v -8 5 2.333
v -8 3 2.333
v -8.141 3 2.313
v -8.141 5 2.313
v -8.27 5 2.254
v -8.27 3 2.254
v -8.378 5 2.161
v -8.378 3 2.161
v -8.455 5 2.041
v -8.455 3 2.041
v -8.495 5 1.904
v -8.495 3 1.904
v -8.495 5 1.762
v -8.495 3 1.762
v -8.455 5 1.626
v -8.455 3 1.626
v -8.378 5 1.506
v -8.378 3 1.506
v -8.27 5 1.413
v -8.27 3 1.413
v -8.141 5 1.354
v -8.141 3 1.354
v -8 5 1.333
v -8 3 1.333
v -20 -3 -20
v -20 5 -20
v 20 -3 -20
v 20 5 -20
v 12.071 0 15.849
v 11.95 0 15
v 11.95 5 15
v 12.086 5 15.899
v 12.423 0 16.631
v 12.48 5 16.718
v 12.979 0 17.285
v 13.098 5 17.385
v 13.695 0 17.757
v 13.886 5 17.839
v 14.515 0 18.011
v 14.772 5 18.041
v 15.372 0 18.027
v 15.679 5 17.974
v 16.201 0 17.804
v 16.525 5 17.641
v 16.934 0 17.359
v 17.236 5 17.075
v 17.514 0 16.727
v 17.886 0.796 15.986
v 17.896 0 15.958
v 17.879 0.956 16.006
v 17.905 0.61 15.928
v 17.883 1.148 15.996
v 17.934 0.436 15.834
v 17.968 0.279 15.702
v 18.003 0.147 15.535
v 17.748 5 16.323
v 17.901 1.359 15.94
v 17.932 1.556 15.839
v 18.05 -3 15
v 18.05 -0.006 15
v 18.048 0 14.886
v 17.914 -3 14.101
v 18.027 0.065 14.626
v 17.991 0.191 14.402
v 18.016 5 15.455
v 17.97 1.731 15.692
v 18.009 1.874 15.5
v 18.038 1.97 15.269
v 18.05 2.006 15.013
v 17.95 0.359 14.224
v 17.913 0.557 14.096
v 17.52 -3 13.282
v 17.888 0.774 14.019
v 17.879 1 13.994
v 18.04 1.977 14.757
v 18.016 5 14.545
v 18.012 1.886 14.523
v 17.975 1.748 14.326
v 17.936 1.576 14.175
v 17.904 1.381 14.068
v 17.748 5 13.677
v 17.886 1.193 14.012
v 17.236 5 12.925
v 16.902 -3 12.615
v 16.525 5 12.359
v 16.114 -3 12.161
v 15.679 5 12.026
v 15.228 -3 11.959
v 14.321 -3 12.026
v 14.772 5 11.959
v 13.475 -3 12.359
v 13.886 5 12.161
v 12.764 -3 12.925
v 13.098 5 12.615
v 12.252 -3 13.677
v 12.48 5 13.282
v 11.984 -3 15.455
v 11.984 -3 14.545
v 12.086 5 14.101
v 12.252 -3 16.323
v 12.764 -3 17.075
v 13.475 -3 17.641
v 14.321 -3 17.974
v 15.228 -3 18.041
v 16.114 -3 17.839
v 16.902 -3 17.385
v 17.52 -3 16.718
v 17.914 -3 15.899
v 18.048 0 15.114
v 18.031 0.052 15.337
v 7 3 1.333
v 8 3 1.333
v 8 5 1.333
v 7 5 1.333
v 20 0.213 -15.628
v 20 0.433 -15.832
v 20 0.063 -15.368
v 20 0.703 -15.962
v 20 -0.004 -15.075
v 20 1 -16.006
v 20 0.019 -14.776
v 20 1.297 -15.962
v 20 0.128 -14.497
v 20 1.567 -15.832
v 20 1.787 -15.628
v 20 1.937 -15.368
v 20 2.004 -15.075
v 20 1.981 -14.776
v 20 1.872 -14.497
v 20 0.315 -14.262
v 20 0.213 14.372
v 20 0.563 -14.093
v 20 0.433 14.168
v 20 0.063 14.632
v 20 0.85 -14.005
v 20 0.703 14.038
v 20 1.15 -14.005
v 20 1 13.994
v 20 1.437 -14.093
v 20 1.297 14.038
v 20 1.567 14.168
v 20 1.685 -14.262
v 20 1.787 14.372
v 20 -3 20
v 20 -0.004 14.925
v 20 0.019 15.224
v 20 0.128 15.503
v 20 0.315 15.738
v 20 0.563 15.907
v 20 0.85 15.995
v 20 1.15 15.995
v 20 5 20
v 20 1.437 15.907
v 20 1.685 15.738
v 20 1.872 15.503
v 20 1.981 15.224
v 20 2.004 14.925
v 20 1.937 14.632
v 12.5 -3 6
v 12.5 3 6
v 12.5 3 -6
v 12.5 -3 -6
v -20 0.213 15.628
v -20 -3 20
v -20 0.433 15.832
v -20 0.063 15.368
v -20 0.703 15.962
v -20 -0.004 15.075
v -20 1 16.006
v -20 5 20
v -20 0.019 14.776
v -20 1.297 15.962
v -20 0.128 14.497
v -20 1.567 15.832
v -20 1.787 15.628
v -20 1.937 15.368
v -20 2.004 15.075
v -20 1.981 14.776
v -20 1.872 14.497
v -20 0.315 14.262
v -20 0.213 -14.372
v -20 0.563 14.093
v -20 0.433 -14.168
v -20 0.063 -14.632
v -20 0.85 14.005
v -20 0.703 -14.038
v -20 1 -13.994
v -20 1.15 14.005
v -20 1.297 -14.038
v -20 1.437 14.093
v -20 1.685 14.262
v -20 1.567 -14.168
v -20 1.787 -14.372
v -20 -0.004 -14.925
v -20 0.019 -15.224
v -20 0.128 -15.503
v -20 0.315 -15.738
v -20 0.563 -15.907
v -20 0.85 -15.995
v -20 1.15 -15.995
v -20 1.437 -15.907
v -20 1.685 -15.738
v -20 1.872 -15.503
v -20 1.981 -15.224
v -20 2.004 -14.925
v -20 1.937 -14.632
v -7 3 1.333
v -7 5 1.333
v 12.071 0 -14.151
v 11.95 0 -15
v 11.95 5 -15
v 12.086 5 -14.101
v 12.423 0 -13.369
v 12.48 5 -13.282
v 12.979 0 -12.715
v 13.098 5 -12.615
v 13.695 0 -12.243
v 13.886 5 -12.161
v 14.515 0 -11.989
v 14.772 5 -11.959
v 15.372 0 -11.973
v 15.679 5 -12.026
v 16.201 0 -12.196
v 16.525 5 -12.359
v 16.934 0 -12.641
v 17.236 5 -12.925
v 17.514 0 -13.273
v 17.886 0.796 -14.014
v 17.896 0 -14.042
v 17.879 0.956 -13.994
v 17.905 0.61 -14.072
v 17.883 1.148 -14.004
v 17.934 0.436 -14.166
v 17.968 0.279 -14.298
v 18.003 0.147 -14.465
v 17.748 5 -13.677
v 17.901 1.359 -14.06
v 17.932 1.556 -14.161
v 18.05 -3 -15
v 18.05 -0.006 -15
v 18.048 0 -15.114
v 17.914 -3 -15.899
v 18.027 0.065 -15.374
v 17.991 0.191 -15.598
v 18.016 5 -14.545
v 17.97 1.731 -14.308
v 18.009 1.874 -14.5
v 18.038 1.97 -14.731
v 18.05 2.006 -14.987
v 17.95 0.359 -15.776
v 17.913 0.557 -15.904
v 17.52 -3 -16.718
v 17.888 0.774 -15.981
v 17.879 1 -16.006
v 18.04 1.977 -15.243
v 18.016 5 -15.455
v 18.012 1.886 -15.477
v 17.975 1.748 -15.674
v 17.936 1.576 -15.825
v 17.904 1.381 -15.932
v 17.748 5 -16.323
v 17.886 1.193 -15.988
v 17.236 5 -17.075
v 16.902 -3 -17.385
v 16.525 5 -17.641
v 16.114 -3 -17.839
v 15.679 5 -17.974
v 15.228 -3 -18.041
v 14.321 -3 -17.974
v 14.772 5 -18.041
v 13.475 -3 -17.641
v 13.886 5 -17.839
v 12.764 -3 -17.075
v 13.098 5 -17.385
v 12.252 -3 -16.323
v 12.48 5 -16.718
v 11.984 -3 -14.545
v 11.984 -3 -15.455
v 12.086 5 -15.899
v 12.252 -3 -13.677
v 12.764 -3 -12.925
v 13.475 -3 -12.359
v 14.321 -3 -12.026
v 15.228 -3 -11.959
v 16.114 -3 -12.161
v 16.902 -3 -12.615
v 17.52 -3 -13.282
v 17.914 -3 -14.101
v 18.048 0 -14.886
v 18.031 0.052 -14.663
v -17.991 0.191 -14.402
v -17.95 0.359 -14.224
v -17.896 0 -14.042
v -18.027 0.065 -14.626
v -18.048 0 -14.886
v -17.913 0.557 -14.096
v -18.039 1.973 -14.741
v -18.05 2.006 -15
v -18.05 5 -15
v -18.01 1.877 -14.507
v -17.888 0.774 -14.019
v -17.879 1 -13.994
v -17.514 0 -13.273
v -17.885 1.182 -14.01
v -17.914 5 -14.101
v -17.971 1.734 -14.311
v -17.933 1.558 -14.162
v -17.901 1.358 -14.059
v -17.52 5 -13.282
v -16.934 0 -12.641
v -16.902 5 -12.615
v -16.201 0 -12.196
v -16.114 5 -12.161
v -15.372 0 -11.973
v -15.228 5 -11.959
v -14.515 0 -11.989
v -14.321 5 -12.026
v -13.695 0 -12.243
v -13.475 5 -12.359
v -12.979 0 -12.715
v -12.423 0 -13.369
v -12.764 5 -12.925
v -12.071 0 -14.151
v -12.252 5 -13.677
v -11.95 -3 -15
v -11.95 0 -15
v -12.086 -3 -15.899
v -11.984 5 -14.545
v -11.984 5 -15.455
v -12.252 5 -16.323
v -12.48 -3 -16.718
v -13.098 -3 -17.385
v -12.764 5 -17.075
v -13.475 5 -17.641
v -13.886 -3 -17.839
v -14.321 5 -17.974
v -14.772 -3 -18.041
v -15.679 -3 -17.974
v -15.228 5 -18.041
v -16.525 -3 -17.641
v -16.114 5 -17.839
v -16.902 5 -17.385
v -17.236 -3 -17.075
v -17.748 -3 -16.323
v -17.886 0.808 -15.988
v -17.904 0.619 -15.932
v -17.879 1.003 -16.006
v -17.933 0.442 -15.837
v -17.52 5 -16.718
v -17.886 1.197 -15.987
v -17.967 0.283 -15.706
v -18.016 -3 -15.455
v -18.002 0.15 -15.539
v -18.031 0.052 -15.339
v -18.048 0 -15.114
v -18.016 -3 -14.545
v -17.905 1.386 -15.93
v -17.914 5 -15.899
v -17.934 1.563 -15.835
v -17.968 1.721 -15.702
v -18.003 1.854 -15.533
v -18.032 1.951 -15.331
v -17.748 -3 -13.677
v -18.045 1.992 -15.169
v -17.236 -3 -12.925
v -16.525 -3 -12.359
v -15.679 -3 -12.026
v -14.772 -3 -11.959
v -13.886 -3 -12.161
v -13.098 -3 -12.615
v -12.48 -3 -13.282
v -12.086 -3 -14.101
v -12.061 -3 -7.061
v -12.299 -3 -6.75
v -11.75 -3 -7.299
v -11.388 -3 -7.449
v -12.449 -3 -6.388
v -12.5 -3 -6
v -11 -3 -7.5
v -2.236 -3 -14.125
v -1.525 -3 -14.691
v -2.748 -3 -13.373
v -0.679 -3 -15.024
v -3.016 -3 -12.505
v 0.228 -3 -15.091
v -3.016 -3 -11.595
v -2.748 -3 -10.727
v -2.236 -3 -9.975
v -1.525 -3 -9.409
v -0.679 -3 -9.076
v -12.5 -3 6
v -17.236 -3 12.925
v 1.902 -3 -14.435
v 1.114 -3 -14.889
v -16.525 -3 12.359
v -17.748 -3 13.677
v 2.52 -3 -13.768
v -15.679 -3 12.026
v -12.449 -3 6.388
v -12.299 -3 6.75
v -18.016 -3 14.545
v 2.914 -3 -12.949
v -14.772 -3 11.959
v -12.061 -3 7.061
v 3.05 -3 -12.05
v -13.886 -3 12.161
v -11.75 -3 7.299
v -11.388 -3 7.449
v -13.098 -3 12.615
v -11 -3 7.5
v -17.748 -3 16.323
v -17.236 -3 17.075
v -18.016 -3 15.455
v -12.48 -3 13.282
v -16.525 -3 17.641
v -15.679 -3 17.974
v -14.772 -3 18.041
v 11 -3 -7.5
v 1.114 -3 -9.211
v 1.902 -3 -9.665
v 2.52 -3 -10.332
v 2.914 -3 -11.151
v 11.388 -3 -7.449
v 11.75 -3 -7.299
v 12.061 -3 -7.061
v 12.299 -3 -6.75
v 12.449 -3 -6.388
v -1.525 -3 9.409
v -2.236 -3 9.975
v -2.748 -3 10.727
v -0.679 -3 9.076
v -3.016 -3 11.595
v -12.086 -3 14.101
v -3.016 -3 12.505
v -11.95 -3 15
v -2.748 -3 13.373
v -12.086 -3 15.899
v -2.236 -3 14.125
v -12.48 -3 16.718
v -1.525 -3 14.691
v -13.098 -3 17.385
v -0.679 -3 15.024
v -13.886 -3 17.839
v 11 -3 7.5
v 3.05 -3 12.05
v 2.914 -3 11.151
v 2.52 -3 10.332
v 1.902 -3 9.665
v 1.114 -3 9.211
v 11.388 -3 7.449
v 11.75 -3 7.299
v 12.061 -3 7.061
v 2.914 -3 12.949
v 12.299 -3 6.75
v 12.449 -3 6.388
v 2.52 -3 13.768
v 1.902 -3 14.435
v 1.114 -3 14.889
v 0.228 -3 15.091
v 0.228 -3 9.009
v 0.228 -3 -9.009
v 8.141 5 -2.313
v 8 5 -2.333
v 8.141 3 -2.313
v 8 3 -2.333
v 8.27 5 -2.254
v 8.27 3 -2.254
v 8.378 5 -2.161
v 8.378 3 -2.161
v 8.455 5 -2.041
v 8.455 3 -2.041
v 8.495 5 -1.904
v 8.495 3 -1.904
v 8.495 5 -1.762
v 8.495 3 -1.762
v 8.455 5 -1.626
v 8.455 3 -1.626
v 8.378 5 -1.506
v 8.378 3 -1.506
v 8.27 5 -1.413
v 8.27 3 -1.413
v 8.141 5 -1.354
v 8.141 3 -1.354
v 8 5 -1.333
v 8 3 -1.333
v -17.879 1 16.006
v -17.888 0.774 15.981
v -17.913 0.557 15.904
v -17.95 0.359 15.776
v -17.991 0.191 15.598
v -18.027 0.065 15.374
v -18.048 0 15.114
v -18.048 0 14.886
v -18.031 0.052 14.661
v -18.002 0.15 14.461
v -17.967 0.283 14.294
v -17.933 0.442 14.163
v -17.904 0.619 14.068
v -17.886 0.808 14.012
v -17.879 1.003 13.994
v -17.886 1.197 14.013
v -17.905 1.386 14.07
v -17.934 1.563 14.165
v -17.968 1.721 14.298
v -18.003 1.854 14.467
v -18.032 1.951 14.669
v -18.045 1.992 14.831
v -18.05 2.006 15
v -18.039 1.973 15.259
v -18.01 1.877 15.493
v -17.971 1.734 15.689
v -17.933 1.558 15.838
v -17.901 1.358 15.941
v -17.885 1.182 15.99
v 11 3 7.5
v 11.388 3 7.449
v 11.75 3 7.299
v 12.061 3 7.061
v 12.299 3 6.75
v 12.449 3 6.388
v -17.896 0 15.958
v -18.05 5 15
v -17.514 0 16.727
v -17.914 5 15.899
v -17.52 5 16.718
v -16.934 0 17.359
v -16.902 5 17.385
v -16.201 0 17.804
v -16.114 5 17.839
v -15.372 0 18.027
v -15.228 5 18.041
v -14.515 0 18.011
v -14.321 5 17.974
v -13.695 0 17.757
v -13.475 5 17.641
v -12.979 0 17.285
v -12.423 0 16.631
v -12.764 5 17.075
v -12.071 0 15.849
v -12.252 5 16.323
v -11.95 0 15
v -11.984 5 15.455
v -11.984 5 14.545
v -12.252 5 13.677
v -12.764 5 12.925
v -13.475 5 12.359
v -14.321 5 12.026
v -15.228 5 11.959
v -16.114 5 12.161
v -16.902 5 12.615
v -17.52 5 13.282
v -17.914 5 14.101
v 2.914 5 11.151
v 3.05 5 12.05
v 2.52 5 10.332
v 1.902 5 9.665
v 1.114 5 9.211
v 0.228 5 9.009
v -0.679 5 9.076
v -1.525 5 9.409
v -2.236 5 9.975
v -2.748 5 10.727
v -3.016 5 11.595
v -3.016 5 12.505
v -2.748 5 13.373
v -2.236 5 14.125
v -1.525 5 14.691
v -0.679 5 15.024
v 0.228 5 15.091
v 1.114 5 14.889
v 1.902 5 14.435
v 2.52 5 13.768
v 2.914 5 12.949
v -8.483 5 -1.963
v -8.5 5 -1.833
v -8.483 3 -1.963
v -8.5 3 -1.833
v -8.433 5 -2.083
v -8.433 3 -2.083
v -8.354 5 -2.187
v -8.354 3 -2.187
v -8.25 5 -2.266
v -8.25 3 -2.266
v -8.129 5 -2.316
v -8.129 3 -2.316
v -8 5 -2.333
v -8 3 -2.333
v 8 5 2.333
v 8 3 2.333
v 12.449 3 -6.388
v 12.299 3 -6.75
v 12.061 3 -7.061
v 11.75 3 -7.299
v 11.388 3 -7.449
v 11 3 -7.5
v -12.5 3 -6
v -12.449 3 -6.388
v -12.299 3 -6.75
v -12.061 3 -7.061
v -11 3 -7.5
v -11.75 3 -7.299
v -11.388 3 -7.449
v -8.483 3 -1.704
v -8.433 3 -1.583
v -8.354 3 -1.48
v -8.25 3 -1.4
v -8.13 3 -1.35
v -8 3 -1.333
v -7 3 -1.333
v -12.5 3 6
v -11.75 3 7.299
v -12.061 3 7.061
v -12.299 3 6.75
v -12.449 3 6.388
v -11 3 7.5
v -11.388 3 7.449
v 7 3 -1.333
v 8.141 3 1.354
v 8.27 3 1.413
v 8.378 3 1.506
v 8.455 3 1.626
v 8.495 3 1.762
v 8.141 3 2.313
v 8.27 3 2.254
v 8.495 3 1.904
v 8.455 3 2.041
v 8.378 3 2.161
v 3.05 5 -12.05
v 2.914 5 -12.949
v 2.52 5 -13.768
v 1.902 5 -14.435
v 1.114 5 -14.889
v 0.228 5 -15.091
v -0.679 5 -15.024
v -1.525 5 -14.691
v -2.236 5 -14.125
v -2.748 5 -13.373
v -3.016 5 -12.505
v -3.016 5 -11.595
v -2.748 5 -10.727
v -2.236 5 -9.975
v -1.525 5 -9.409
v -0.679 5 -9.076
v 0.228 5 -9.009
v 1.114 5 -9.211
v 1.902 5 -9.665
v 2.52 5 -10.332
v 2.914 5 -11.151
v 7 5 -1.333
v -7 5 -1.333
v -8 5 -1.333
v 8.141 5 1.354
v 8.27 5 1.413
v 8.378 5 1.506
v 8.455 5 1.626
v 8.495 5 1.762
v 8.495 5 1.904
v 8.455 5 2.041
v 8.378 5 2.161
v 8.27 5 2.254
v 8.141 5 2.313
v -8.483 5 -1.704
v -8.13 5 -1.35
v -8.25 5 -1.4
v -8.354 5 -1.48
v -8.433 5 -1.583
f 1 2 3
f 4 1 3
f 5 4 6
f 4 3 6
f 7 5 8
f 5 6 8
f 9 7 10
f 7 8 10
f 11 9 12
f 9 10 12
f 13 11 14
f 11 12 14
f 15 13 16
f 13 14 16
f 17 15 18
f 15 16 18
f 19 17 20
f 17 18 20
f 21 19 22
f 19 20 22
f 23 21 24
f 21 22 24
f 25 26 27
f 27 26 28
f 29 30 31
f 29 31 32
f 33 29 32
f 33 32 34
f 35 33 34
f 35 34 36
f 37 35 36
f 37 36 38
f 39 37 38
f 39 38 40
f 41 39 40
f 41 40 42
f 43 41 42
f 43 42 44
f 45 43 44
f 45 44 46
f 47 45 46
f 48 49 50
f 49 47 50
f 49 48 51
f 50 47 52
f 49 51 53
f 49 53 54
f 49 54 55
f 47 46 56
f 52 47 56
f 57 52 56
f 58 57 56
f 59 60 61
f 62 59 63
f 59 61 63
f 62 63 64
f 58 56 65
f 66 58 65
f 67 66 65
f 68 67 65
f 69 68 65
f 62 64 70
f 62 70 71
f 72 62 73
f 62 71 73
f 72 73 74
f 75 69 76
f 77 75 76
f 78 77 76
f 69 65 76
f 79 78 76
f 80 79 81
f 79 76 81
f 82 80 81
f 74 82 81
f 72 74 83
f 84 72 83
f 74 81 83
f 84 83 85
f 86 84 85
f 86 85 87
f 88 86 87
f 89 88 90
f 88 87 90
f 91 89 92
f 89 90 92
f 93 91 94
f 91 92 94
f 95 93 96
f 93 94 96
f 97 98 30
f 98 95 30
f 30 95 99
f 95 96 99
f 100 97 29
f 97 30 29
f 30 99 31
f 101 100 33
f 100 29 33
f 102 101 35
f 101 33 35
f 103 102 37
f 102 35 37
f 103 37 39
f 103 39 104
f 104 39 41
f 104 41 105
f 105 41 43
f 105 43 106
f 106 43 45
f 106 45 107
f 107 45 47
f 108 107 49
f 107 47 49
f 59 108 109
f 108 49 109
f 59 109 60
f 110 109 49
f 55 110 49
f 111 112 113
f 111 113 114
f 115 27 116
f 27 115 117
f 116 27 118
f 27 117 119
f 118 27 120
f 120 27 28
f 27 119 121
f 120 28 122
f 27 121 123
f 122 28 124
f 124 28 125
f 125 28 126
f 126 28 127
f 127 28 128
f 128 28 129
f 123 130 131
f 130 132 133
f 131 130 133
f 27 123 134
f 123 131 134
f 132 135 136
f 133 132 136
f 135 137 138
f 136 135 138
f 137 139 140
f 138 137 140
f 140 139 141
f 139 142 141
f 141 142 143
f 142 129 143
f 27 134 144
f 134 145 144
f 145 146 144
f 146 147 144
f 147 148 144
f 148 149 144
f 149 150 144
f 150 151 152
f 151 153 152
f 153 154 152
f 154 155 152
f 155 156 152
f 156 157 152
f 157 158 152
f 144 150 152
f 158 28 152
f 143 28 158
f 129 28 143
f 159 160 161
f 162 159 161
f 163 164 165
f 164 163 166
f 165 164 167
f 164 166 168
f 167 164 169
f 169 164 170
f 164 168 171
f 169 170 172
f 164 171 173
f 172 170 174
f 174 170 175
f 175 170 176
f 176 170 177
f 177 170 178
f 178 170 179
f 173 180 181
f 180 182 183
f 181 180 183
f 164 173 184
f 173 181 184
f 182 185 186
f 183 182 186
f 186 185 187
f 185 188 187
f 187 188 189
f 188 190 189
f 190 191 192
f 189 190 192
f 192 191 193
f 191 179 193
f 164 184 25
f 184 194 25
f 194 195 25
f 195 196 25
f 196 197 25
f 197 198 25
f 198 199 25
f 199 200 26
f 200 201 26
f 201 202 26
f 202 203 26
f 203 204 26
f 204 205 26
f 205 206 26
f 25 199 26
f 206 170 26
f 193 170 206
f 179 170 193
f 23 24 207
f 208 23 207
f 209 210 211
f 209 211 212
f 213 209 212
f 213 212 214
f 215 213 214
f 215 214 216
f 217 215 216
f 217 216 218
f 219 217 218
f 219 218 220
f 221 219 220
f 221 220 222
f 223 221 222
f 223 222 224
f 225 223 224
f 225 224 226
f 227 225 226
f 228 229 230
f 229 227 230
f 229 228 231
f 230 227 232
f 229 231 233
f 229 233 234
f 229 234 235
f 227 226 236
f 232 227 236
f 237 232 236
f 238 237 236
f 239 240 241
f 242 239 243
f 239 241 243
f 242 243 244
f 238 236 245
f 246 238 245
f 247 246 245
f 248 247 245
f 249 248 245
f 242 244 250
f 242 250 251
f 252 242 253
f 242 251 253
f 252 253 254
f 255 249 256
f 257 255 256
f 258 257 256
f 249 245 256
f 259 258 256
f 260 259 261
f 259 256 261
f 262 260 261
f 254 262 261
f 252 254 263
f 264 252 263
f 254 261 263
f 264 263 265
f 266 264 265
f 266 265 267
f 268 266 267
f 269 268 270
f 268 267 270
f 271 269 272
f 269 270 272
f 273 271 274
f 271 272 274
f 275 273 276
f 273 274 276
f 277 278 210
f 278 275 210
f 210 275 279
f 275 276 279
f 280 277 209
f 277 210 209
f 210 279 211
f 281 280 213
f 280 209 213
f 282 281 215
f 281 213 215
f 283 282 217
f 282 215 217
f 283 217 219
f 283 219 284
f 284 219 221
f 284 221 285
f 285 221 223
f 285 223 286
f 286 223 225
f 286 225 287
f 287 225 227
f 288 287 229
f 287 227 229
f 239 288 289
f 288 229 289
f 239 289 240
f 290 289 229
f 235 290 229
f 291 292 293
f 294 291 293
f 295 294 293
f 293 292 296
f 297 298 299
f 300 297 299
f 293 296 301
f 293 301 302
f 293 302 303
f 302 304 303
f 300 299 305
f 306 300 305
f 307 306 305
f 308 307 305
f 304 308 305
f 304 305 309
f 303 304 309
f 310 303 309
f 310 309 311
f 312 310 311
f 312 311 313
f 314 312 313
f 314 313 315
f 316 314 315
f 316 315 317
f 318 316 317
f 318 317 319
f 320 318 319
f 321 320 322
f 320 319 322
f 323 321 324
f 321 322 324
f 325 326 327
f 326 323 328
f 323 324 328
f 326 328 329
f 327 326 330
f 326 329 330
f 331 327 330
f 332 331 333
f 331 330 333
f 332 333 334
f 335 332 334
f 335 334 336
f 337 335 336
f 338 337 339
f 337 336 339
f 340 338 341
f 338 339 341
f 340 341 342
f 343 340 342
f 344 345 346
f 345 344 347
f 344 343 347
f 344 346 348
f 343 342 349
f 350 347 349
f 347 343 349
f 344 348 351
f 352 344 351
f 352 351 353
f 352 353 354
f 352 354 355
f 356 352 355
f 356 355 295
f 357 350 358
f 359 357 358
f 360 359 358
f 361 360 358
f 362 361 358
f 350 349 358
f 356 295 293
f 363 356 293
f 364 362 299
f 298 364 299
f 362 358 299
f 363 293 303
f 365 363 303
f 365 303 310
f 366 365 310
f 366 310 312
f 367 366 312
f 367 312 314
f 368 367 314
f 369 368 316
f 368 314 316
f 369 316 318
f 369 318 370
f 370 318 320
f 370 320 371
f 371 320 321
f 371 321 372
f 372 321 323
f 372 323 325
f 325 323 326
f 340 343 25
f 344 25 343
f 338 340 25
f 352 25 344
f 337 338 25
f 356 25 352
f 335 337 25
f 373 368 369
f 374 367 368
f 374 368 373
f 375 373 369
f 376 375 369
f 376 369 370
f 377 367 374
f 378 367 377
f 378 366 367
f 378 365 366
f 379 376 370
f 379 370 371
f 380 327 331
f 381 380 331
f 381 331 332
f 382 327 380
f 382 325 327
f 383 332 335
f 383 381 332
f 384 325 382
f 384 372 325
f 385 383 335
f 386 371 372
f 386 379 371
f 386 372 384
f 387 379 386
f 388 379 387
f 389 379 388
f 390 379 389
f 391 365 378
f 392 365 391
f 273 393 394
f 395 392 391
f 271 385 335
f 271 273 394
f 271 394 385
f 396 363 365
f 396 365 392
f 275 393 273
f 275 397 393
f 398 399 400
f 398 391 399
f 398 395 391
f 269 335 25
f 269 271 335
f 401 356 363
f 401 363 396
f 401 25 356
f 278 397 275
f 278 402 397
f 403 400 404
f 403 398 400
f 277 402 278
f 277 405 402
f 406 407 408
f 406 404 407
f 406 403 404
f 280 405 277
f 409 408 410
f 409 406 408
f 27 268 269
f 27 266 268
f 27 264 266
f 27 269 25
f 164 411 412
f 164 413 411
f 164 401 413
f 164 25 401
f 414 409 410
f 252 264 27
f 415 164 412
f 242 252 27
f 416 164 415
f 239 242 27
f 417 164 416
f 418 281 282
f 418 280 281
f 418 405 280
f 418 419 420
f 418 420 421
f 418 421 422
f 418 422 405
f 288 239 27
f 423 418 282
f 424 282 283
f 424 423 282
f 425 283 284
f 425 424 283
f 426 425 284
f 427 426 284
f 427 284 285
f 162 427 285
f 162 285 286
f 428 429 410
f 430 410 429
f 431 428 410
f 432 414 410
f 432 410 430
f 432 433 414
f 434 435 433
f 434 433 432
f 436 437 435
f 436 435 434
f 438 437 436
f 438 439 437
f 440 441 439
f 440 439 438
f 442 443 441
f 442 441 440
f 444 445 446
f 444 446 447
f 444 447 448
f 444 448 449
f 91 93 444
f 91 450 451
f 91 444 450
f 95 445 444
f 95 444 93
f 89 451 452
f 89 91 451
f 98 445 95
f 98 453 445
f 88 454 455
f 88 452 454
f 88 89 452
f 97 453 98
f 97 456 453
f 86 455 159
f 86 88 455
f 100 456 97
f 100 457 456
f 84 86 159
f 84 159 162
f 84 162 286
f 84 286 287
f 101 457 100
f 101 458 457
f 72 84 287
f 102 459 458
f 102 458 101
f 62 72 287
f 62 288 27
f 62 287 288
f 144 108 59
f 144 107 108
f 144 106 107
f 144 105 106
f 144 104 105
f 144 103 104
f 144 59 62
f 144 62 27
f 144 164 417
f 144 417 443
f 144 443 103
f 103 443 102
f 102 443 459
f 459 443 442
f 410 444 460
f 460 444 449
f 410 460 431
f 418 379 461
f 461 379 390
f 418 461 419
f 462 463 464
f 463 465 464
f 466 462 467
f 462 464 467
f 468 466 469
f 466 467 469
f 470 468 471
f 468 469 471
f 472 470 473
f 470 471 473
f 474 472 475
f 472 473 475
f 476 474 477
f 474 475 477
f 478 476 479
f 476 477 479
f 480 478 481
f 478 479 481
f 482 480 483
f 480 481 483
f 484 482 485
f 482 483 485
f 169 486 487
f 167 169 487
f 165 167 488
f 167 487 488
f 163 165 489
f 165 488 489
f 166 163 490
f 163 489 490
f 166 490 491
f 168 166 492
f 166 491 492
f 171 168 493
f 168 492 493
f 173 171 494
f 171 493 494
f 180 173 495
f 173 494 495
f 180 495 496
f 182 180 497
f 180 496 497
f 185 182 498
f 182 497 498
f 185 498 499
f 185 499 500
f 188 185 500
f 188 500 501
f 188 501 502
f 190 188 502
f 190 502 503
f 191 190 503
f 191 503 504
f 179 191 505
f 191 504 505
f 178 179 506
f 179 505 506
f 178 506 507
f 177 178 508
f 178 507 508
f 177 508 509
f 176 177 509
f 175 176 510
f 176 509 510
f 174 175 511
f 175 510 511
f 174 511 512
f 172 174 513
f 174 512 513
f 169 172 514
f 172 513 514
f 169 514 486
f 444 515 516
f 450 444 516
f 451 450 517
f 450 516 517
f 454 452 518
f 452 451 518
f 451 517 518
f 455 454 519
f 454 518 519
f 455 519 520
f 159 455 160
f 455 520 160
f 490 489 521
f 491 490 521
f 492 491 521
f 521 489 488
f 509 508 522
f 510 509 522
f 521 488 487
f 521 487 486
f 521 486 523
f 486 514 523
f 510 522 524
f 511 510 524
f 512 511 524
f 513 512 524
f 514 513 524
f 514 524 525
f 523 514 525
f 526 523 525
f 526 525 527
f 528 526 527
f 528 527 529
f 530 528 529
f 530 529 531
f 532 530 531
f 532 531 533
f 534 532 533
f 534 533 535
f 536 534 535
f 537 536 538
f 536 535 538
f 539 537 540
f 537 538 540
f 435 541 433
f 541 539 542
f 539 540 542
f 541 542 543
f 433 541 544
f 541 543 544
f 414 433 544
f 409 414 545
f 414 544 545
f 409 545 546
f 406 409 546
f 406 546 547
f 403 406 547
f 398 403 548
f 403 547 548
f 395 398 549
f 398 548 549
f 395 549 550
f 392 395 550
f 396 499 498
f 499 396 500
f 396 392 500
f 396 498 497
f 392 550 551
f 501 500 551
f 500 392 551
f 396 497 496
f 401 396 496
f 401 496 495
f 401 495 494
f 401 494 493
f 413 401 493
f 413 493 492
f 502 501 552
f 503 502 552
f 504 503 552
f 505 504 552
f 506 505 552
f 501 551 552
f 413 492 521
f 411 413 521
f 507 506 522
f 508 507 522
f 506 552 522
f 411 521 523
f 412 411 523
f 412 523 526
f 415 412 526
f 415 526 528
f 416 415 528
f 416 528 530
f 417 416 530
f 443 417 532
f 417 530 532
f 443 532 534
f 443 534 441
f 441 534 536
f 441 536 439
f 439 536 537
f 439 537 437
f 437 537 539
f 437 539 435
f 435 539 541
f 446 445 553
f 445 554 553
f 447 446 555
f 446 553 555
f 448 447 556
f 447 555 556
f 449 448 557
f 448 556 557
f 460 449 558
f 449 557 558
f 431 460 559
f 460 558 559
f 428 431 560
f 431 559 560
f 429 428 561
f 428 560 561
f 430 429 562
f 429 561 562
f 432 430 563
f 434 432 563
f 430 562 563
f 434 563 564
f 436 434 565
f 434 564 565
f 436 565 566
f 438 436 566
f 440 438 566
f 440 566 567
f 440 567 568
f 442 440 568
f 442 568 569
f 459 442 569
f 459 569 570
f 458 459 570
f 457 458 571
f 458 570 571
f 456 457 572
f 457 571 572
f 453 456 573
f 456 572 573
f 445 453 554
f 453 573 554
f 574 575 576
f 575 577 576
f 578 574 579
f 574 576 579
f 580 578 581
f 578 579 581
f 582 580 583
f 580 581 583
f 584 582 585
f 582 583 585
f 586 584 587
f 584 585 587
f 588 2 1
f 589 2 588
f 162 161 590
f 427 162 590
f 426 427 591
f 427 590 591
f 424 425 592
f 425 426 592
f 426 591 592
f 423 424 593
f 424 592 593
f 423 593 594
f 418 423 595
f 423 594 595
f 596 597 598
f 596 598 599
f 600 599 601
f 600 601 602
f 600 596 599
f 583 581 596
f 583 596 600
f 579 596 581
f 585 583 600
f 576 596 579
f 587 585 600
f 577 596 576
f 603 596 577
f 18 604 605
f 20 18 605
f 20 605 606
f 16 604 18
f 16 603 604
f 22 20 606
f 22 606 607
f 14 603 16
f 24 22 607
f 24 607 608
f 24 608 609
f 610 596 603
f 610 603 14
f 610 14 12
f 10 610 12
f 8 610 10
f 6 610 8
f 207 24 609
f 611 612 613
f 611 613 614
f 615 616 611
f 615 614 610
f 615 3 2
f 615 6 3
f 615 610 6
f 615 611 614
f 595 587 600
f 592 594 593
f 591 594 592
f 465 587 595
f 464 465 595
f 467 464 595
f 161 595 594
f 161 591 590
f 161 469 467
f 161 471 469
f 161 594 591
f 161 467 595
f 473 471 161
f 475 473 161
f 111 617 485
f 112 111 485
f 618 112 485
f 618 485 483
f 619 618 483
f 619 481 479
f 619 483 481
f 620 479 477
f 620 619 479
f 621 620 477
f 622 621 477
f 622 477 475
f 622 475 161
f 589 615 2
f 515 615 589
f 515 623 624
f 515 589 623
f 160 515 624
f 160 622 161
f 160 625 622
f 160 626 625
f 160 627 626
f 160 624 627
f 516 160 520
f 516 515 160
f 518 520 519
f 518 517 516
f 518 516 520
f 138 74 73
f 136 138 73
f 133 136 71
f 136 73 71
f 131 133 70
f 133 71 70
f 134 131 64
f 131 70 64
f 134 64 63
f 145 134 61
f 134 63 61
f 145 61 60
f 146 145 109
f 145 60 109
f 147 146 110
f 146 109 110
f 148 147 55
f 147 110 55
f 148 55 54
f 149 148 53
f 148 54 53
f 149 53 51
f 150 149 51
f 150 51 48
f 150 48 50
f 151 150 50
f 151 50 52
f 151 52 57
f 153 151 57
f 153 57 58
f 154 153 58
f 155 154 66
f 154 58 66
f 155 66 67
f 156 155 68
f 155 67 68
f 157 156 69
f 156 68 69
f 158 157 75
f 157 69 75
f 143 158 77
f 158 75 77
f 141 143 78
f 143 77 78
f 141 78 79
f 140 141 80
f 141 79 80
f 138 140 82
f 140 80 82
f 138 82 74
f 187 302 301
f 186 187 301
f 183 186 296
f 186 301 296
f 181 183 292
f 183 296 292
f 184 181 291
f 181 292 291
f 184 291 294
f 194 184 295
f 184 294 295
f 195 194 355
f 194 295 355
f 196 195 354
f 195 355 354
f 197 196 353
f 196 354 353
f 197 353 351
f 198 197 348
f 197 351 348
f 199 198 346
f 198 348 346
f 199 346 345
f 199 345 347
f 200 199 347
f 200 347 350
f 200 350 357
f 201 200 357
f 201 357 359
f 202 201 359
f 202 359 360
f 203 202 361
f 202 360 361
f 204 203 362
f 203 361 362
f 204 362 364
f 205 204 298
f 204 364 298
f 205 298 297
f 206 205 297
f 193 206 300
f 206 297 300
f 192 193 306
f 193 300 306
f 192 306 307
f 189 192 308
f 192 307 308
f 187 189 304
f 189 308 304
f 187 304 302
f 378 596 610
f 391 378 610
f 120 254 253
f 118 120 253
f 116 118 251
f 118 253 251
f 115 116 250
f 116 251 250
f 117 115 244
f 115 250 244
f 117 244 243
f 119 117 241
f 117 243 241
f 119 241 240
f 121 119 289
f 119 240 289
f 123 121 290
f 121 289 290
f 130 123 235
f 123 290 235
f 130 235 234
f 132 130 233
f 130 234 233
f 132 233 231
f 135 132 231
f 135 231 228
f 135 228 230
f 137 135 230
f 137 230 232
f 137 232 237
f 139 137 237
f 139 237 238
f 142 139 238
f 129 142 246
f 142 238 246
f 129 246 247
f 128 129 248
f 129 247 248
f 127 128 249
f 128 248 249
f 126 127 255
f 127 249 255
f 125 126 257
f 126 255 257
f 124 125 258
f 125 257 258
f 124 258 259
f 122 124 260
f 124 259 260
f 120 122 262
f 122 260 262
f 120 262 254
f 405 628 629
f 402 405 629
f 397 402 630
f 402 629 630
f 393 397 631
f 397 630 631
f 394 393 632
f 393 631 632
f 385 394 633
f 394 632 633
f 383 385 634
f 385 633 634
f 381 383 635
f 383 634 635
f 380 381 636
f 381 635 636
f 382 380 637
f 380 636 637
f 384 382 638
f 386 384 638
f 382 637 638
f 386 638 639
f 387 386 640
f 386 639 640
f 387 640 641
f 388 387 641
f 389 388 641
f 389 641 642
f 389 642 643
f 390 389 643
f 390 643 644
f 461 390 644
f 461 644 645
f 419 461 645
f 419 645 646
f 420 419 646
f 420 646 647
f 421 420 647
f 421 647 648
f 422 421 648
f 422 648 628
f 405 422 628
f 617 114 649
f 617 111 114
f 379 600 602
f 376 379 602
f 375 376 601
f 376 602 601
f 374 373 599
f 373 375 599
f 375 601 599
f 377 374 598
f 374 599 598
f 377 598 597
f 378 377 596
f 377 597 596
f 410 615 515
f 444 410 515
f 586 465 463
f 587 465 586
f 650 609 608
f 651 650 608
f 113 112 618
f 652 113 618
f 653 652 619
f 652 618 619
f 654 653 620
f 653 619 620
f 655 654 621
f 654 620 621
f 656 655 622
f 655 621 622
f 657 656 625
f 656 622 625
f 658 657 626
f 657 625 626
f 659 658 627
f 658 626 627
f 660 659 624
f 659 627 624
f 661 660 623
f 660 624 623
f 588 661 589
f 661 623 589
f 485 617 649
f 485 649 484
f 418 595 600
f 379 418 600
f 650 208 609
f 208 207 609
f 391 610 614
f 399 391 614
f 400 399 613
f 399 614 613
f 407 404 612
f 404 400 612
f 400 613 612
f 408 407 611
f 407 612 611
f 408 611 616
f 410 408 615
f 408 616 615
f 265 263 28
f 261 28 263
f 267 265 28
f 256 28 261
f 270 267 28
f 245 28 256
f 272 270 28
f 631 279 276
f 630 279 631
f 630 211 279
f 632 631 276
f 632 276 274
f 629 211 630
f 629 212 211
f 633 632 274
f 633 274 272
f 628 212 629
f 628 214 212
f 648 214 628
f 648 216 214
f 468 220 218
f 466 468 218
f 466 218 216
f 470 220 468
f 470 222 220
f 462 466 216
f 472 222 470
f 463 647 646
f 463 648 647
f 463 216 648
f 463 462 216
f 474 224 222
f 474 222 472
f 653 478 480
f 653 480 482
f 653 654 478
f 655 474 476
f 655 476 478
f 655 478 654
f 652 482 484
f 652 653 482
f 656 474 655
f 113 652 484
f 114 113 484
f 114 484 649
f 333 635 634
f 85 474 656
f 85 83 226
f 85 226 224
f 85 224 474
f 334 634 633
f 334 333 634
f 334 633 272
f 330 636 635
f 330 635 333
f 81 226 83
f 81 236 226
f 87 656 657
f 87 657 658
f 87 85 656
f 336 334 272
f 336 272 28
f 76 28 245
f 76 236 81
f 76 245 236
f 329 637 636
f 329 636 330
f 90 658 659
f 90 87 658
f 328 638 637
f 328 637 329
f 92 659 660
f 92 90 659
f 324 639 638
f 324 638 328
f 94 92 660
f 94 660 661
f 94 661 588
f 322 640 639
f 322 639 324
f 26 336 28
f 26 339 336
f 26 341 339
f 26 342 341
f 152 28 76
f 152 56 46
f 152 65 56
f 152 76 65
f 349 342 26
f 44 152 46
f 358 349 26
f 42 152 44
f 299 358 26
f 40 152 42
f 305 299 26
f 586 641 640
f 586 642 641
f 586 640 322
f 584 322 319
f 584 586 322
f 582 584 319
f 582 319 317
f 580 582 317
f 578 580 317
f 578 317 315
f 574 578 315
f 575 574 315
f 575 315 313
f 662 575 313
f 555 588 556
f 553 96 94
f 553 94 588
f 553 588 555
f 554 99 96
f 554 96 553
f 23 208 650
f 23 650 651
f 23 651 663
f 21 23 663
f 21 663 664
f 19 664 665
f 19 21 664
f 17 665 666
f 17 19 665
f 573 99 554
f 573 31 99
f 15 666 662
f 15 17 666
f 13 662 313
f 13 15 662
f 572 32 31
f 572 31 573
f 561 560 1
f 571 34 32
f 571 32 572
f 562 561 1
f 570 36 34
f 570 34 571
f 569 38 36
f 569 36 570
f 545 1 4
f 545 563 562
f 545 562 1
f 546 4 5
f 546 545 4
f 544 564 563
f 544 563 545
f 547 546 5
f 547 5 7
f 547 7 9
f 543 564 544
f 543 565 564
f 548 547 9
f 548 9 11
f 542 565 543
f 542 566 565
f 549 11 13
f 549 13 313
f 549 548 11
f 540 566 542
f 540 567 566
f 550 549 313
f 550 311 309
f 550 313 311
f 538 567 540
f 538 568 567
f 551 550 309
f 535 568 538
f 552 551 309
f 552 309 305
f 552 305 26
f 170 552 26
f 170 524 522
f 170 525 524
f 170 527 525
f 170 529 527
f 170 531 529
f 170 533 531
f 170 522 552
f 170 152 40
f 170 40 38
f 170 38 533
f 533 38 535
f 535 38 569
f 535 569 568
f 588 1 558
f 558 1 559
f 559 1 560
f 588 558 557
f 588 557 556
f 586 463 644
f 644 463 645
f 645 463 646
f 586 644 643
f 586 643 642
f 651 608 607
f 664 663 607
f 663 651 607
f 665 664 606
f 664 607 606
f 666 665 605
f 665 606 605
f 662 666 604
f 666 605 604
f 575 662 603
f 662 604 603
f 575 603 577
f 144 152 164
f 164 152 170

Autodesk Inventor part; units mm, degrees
ref_plane "YZ Plane" through (0, 0, 0) normal (1, 0, 0) x (0, 1, 0)
ref_plane "XZ Plane" through (0, 0, 0) normal (0, 1, 0) x (-1, 0, 0)
ref_plane "XY Plane" through (0, 0, 0) normal (0, 0, 1) x (1, 0, 0)
sketch "Sketch1" plane through (0, 0, 0) normal (0, 1, 0) x (-1, 0, 0)
  line L0 (20, 20) -> (20, -20)
  line L1 (20, -20) -> (-20, -20)
  line L2 (-20, -20) -> (-20, 20)
  line L3 (-20, 20) -> (20, 20)
  line L4 (-15, 15) -> (-15, -15) construction
  line L5 (-15, -15) -> (15, -15) construction
  line L6 (15, -15) -> (15, 15) construction
  line L7 (15, 15) -> (-15, 15) construction
  circle A0 centre (15, 15) radius 3.05
  circle A1 centre (15, -15) radius 3.05
  circle A2 centre (-15, -15) radius 3.05
  circle A3 centre (-15, 15) radius 3.05
  line L8 (0, 0) -> (-18.5703, 0) construction
  line L9 (0, 0) -> (0, 25.6262) construction
  line L10 (0, 0) -> (-18.05, 0) construction
  line L11 (8, 2.3333) -> (-8, 2.3333)
  line L12 (-8.5, 1.8333) -> (-8.5, 1.8333)
  line L13 (8.5, 1.8333) -> (8.5, 1.8333)
  line L14 (8.5, 2.3333) -> (-8.5, 3.0056) construction
  line L15 (-8.5, 2.3333) -> (8.5, 3.0548) construction
  arc A4 (8.5, 1.8333) -> (8, 2.3333) centre (8, 1.8333) ccw
  arc A5 (8, 1.3333) -> (8.5, 1.8333) centre (8, 1.8333) ccw
  arc A6 (-8.5, 1.8333) -> (-8, 1.3333) centre (-8, 1.8333) ccw
  arc A7 (-8, 2.3333) -> (-8.5, 1.8333) centre (-8, 1.8333) ccw
  line L16 (-8.5, -1.8333) -> (-8.5, -1.8333)
  line L17 (-8, -2.3333) -> (8, -2.3333)
  line L18 (8.5, -1.8333) -> (8.5, -1.8333)
  line L19 (8.5, -0.691) -> (-8.5, -2.3333) construction
  line L20 (-8.5, -0.6827) -> (8.5, -2.3333) construction
  arc A8 (8.5, -1.8333) -> (8.0002, -1.3333) centre (8, -1.8333) ccw
  arc A9 (8, -2.3333) -> (8.5, -1.8333) centre (8, -1.8333) ccw
  arc A10 (-8.5, -1.8333) -> (-8, -2.3333) centre (-8, -1.8333) ccw
  arc A11 (-8, -1.3333) -> (-8.5, -1.8333) centre (-8, -1.8333) ccw
  line L21 (8, 1.3333) -> (7, 1.3333)
  line L22 (7, 1.3333) -> (7, -1.3333)
  line L23 (7, -1.3333) -> (8.0002, -1.3333)
  line L24 (-8, 1.3333) -> (-7, 1.3333)
  line L25 (-7, 1.3333) -> (-7, -1.3333)
  line L26 (-7, -1.3333) -> (-8, -1.3333)
  point P0 (0, -12.01)
  point P1 (-0.3001, 2.6813)
  point P2 (0, 2.694)
  point P3 (0.0215, -1.5101)
  point P4 (0, -1.508)
  point P5 (0, -1.5122)
  dimension "d0" = 40
  dimension "d1" = 40
  dimension "d2" = 30
  dimension "d53" = 20
  dimension "d114" = 17
  dimension "d117" = 0.5
  dimension "d140" = 17
  dimension "d142" = 0.5
  dimension "d146" = 14
  dimension "d147" = 7
  dimension "d150" = 1.3333
  dimension "d151" = 1.3333
  dimension "d152" = 2.3333
  dimension "d153" = 2.3333
extrude "Extrusion15" add sketch "Sketch1" along normal blind 5
sketch "Sketch11" plane through (0, 0, 0) normal (0, -1, 0) x (1, 0, 0)
  line L0 (-11, -7.5) -> (11, -7.5)
  line L1 (12.5, -6) -> (12.5, 6)
  line L2 (11, 7.5) -> (-11, 7.5)
  line L3 (-12.5, 6) -> (-12.5, -6)
  line L4 (-12.5, -7.5) -> (12.5, 7.5) construction
  line L5 (12.5, -7.5) -> (-12.5, 7.5) construction
  arc A0 (-11, 7.5) -> (-12.5, 6) centre (-11, 6) ccw
  arc A1 (-12.5, -6) -> (-11, -7.5) centre (-11, -6) ccw
  arc A2 (11, -7.5) -> (12.5, -6) centre (11, -6) ccw
  arc A3 (12.5, 6) -> (11, 7.5) centre (11, 6) ccw
  point P0 (0, 0)
  dimension "d154" = 15
  dimension "d155" = 25
  dimension "d156" = 1.5
extrude "Extrusion16" cut sketch "Sketch11" against normal blind 3
sketch "Sketch14" plane through (0, 0, 0) normal (0, -1, 0) x (1, 0, 0)
  arc A0 (-12.5, -6) -> (-11, -7.5) centre (-11, -6) ccw projected
  line L0 (-12.5, -6) -> (-12.5, 6) projected
  arc A1 (-11, 7.5) -> (-12.5, 6) centre (-11, 6) ccw projected
  line L1 (-11, 7.5) -> (11, 7.5) projected
  arc A2 (12.5, 6) -> (11, 7.5) centre (11, 6) ccw projected
  line L2 (12.5, 6) -> (12.5, -6) projected
  arc A3 (11, -7.5) -> (12.5, -6) centre (11, -6) ccw projected
  line L3 (11, -7.5) -> (-11, -7.5) projected
  circle A4 centre (15, 15) radius 3.05 projected
  circle A5 centre (15, -15) radius 3.05 projected
  circle A6 centre (-15, -15) radius 3.05 projected
  circle A7 centre (-15, 15) radius 3.05 projected
  line L4 (-20, 20) -> (-20, -20) projected
  line L5 (-20, -20) -> (20, -20) projected
  line L6 (20, -20) -> (20, 20) projected
  line L7 (20, 20) -> (-20, 20) projected
  point P0 (0, 0)
extrude "Extrusion17" add sketch "Sketch14" along normal blind 3
sketch "Sketch12" plane through (20, 0, 20) normal (1, 0, 0) x (0, 0, -1)
  line L0 (40, 5) -> (40, -3) projected
  line L1 (0, 5) -> (40, 5) projected
  line L2 (0, 5) -> (0, -3) projected
  line L3 (40, -3) -> (0, -3) projected
  point P0 (20, 0)
  point P1 (5, 1)
  point P2 (35, 1)
  dimension "d163" = 5
  dimension "d164" = 5
  dimension "d165" = 4
  dimension "d166" = 4
hole "Hole1" at (20, 1, 15) at (20, 1, -15) direction (-1, 0, 0) diameter 2.013 depth 5 tip angle 118 thread size "M2.5x0.45" class "6H" standard "ISO Metric profile"
sketch "Sketch13" plane through (-20, 0, -20) normal (-1, 0, 0) x (0, 0, 1)
  line L0 (40, -3) -> (40, 5) projected
  line L1 (0, 5) -> (40, 5) projected
  line L2 (0, 5) -> (0, -3) projected
  circle A0 centre (35, 1) radius 1.0065 projected
  circle A1 centre (5, 1) radius 1.0065 projected
  line L3 (40, -3) -> (0, -3) projected
  point P0 (20, 0)
  point P1 (33.9935, 1)
  point P2 (3.9935, 1)
hole "Hole2" at (-20, 1, 15) at (-20, 1, -15) direction (1, 0, 0) diameter 2.013 depth 5 tip angle 118 thread size "M2.5x0.45" class "6H" standard "ISO Metric profile"
sketch "Sketch15" plane through (0, 5, 0) normal (0, 1, 0) x (1, 0, 0)
  circle A0 centre (0, -12.05) radius 3.05
  circle A1 centre (0, 12.05) radius 3.05
  point P0 (0, 0)
  dimension "d183" = 6.1
  dimension "d184" = 12.05
  dimension "d185" = 6.1
  dimension "d186" = 12.05
extrude "Extrusion18" cut sketch "Sketch15" against normal blind 10
equation "\"d1\" = d0"
properties part number "HolderStartV2"
